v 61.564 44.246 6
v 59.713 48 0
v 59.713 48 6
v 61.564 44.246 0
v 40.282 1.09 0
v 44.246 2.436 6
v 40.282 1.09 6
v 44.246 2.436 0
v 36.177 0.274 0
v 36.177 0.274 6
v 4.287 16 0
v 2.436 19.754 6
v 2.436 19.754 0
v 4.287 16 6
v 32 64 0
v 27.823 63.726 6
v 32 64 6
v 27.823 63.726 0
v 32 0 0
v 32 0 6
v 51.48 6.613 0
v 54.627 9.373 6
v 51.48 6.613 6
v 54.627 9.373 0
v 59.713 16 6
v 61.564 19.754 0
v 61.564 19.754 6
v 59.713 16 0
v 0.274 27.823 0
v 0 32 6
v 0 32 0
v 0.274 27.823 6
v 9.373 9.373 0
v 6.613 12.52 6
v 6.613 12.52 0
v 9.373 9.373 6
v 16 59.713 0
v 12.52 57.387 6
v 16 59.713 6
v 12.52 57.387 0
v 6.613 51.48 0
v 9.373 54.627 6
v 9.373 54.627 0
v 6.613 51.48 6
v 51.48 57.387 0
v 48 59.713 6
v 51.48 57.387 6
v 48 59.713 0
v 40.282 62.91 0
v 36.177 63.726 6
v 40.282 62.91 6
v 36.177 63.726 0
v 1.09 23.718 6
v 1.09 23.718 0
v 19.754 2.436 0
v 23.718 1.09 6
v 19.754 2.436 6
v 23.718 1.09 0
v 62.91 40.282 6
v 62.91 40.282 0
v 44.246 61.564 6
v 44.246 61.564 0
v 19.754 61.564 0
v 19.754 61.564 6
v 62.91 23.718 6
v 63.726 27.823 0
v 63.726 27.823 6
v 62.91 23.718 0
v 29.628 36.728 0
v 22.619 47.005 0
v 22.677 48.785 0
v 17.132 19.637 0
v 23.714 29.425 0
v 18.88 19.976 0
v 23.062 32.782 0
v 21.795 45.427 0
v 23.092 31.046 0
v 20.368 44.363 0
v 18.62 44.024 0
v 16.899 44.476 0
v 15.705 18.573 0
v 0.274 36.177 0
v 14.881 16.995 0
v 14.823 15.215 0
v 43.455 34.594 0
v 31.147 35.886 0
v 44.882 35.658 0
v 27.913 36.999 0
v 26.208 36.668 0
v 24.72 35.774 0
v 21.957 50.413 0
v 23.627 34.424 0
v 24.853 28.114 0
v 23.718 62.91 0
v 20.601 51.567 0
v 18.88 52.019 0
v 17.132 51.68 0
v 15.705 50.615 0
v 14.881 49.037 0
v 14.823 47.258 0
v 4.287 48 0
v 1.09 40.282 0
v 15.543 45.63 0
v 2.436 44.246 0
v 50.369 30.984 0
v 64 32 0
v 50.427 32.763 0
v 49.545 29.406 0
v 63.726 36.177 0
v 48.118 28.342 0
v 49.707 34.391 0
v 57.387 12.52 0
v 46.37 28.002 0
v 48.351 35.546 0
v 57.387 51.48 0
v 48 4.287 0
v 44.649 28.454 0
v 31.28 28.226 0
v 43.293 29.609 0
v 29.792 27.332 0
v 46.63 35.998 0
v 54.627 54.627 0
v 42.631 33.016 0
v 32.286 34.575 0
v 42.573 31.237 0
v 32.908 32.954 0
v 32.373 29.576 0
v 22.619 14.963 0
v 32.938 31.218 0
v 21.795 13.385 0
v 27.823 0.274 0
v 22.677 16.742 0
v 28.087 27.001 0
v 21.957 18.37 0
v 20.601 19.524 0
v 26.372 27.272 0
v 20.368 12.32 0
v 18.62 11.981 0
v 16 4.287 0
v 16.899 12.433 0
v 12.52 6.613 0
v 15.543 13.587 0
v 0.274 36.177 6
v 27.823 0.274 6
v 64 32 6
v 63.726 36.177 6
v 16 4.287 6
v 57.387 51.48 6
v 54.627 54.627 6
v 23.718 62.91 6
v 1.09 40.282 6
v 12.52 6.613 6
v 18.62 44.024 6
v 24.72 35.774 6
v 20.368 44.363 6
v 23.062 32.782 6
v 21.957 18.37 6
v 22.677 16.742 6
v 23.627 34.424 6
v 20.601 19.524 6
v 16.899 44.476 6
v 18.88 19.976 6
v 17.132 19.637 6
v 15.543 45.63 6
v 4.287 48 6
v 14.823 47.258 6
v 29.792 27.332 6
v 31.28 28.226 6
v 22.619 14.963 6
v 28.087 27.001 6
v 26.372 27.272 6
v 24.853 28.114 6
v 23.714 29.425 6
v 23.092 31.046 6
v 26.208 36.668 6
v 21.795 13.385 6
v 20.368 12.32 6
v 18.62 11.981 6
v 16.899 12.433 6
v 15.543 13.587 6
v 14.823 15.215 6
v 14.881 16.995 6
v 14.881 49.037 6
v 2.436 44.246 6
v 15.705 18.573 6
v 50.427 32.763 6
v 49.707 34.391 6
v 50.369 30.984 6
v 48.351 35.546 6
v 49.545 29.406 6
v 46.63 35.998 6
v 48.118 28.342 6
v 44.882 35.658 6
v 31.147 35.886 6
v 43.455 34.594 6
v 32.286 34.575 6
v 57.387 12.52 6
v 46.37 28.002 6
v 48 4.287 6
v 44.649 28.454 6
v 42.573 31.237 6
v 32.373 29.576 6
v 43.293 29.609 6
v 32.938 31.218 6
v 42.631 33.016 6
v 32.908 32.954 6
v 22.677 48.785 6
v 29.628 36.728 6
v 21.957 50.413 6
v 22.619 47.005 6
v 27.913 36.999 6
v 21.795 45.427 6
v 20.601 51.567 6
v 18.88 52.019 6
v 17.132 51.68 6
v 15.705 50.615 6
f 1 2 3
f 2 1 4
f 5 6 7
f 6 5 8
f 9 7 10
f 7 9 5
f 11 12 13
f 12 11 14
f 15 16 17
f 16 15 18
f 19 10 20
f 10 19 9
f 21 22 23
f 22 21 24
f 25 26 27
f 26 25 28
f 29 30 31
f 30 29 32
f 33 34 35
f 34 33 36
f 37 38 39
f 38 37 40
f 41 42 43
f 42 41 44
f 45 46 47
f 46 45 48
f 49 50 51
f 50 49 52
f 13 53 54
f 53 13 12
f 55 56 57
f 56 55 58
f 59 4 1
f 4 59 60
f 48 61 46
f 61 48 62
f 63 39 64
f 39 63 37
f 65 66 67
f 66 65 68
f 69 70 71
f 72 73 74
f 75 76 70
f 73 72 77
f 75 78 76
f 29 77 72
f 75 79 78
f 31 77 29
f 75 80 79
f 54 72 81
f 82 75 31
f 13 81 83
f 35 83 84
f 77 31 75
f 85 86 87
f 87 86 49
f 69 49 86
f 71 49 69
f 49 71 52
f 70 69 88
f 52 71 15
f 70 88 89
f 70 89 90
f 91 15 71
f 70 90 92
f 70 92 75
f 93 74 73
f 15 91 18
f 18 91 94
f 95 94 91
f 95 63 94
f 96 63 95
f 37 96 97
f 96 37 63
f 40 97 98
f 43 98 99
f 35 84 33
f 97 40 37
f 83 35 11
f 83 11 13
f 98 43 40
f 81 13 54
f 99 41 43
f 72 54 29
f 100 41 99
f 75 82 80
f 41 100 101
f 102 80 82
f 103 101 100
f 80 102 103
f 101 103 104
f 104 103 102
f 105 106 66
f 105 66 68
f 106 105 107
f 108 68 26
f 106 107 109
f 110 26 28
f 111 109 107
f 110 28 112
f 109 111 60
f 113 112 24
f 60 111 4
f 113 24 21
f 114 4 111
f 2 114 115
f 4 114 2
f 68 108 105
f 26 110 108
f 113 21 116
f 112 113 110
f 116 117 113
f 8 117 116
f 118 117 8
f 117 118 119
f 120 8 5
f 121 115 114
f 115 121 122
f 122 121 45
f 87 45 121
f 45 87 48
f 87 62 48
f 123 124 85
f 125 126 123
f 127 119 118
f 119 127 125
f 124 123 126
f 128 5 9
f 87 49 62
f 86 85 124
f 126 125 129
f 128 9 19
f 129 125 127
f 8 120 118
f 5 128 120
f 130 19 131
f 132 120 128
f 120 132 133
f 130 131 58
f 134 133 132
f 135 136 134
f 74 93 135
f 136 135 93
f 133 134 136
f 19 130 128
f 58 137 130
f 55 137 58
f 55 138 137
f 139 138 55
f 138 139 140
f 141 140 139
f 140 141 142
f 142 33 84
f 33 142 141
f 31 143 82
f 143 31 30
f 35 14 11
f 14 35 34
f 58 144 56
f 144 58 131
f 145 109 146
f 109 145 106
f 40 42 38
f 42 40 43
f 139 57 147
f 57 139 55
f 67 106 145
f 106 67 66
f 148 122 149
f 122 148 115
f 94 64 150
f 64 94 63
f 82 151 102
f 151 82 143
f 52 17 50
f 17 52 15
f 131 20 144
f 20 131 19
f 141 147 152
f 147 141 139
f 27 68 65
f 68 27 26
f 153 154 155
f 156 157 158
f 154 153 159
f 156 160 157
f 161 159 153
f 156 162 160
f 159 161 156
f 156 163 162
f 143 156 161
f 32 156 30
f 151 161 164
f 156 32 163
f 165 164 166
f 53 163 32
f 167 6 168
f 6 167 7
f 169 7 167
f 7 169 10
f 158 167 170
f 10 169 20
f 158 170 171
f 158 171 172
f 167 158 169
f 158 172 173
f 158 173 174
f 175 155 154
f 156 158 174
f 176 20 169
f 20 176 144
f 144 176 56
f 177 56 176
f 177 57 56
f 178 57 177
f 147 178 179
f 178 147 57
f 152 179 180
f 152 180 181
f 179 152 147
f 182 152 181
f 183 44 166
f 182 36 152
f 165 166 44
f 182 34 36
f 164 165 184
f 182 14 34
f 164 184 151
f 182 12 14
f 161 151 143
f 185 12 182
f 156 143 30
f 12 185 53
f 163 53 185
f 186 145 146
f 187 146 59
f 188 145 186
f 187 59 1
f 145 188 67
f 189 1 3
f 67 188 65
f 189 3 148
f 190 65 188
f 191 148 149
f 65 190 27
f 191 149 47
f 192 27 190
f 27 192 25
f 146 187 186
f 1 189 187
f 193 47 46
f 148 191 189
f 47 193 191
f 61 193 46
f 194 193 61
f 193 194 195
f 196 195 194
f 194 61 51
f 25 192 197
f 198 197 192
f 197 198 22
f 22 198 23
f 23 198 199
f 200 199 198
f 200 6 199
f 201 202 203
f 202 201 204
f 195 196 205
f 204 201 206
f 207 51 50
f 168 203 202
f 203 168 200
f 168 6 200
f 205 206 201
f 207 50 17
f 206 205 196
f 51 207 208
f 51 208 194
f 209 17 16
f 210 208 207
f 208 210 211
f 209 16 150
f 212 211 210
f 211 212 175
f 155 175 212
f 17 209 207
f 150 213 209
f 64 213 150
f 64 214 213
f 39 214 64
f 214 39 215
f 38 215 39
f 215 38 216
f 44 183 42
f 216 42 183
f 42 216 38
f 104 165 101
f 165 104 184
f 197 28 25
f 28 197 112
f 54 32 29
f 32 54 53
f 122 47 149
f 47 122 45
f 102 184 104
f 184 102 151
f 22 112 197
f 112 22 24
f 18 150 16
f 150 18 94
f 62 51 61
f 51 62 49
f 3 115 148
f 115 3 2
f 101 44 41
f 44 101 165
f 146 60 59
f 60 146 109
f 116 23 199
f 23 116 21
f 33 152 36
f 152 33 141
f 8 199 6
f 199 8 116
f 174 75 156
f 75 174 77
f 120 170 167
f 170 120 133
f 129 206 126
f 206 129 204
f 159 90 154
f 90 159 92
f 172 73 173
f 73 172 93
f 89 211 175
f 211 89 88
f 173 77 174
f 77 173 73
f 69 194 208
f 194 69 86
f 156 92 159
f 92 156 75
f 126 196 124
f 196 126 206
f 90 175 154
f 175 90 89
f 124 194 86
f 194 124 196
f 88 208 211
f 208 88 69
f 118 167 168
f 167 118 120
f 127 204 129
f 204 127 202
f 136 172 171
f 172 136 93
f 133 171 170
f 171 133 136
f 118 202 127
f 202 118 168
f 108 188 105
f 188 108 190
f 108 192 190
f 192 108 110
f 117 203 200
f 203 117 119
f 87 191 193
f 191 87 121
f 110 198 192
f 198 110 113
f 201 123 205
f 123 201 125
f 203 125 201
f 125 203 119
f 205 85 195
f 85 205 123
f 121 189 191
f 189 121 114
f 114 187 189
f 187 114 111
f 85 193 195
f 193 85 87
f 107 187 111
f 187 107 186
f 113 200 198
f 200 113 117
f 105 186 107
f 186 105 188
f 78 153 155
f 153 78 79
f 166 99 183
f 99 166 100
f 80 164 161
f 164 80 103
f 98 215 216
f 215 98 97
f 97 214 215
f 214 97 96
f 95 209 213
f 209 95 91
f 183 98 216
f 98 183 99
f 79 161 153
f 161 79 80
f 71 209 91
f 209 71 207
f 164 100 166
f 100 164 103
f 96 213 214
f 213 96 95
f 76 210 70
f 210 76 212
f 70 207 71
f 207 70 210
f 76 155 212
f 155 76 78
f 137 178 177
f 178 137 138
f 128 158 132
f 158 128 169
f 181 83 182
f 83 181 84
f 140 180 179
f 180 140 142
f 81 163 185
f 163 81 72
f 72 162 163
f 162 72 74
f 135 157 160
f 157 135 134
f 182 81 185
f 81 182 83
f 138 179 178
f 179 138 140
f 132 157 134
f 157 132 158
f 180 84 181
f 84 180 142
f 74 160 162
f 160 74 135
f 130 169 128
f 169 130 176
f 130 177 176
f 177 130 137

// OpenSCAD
$fn = 32;

// ----------------------------------------------------------------------
// Cam plate: eccentric cam, base R32
// ----------------------------------------------------------------------

// --- parameters (mm) ---
base_r = 32;              // base circle radius
lobe_h = 10;              // cam lobe rise
bore_r = 5;               // shaft bore radius
plate_t = 6;              // plate thickness, Z (extrusion height)
ecc = 4;                  // disc eccentricity
ring_r = 18.5;            // lightening ring radius
bolt_r = 4;               // lightening hole radius

profile = [[64, 32], [63.726, 36.177], [62.91, 40.282], [61.564, 44.246], [59.713, 48], [57.387, 51.48], [54.627, 54.627], [51.48, 57.387], [48, 59.713], [44.246, 61.564], [40.282, 62.91], [36.177, 63.726], [32, 64], [27.823, 63.726], [23.718, 62.91], [19.754, 61.564], [16, 59.713], [12.52, 57.387], [9.373, 54.627], [6.613, 51.48], [4.287, 48], [2.436, 44.246], [1.09, 40.282], [0.274, 36.177], [0, 32], [0.274, 27.823], [1.09, 23.718], [2.436, 19.754], [4.287, 16], [6.613, 12.52], [9.373, 9.373], [12.52, 6.613], [16, 4.287], [19.754, 2.436], [23.718, 1.09], [27.823, 0.274], [32, 0], [36.177, 0.274], [40.282, 1.09], [44.246, 2.436], [48, 4.287], [51.48, 6.613], [54.627, 9.373], [57.387, 12.52], [59.713, 16], [61.564, 19.754], [62.91, 23.718], [63.726, 27.823]];  // primary outline, 48 points, counter clockwise
void_1 = [[32.908, 32.954], [32.286, 34.575], [31.147, 35.886], [29.628, 36.728], [27.913, 36.999], [26.208, 36.668], [24.72, 35.774], [23.627, 34.424], [23.062, 32.782], [23.092, 31.046], [23.714, 29.425], [24.853, 28.114], [26.372, 27.272], [28.087, 27.001], [29.792, 27.332], [31.28, 28.226], [32.373, 29.576], [32.938, 31.218]];  // shaft bore, 18 points
void_2 = [[50.427, 32.763], [49.707, 34.391], [48.351, 35.546], [46.63, 35.998], [44.882, 35.658], [43.455, 34.594], [42.631, 33.016], [42.573, 31.237], [43.293, 29.609], [44.649, 28.454], [46.37, 28.002], [48.118, 28.342], [49.545, 29.406], [50.369, 30.984]];  // lightening hole 1, 14 points
void_3 = [[22.677, 48.785], [21.957, 50.413], [20.601, 51.567], [18.88, 52.019], [17.132, 51.68], [15.705, 50.615], [14.881, 49.037], [14.823, 47.258], [15.543, 45.63], [16.899, 44.476], [18.62, 44.024], [20.368, 44.363], [21.795, 45.427], [22.619, 47.005]];  // lightening hole 2, 14 points
void_4 = [[22.677, 16.742], [21.957, 18.37], [20.601, 19.524], [18.88, 19.976], [17.132, 19.637], [15.705, 18.573], [14.881, 16.995], [14.823, 15.215], [15.543, 13.587], [16.899, 12.433], [18.62, 11.981], [20.368, 12.32], [21.795, 13.385], [22.619, 14.963]];  // lightening hole 3, 14 points

// --- the one profile operation ---
difference() {
  linear_extrude(height = plate_t) polygon(points = profile);
  translate([0, 0, -1])
    linear_extrude(height = plate_t + 2) polygon(points = void_1);
  translate([0, 0, -1])
    linear_extrude(height = plate_t + 2) polygon(points = void_2);
  translate([0, 0, -1])
    linear_extrude(height = plate_t + 2) polygon(points = void_3);
  translate([0, 0, -1])
    linear_extrude(height = plate_t + 2) polygon(points = void_4);
}
